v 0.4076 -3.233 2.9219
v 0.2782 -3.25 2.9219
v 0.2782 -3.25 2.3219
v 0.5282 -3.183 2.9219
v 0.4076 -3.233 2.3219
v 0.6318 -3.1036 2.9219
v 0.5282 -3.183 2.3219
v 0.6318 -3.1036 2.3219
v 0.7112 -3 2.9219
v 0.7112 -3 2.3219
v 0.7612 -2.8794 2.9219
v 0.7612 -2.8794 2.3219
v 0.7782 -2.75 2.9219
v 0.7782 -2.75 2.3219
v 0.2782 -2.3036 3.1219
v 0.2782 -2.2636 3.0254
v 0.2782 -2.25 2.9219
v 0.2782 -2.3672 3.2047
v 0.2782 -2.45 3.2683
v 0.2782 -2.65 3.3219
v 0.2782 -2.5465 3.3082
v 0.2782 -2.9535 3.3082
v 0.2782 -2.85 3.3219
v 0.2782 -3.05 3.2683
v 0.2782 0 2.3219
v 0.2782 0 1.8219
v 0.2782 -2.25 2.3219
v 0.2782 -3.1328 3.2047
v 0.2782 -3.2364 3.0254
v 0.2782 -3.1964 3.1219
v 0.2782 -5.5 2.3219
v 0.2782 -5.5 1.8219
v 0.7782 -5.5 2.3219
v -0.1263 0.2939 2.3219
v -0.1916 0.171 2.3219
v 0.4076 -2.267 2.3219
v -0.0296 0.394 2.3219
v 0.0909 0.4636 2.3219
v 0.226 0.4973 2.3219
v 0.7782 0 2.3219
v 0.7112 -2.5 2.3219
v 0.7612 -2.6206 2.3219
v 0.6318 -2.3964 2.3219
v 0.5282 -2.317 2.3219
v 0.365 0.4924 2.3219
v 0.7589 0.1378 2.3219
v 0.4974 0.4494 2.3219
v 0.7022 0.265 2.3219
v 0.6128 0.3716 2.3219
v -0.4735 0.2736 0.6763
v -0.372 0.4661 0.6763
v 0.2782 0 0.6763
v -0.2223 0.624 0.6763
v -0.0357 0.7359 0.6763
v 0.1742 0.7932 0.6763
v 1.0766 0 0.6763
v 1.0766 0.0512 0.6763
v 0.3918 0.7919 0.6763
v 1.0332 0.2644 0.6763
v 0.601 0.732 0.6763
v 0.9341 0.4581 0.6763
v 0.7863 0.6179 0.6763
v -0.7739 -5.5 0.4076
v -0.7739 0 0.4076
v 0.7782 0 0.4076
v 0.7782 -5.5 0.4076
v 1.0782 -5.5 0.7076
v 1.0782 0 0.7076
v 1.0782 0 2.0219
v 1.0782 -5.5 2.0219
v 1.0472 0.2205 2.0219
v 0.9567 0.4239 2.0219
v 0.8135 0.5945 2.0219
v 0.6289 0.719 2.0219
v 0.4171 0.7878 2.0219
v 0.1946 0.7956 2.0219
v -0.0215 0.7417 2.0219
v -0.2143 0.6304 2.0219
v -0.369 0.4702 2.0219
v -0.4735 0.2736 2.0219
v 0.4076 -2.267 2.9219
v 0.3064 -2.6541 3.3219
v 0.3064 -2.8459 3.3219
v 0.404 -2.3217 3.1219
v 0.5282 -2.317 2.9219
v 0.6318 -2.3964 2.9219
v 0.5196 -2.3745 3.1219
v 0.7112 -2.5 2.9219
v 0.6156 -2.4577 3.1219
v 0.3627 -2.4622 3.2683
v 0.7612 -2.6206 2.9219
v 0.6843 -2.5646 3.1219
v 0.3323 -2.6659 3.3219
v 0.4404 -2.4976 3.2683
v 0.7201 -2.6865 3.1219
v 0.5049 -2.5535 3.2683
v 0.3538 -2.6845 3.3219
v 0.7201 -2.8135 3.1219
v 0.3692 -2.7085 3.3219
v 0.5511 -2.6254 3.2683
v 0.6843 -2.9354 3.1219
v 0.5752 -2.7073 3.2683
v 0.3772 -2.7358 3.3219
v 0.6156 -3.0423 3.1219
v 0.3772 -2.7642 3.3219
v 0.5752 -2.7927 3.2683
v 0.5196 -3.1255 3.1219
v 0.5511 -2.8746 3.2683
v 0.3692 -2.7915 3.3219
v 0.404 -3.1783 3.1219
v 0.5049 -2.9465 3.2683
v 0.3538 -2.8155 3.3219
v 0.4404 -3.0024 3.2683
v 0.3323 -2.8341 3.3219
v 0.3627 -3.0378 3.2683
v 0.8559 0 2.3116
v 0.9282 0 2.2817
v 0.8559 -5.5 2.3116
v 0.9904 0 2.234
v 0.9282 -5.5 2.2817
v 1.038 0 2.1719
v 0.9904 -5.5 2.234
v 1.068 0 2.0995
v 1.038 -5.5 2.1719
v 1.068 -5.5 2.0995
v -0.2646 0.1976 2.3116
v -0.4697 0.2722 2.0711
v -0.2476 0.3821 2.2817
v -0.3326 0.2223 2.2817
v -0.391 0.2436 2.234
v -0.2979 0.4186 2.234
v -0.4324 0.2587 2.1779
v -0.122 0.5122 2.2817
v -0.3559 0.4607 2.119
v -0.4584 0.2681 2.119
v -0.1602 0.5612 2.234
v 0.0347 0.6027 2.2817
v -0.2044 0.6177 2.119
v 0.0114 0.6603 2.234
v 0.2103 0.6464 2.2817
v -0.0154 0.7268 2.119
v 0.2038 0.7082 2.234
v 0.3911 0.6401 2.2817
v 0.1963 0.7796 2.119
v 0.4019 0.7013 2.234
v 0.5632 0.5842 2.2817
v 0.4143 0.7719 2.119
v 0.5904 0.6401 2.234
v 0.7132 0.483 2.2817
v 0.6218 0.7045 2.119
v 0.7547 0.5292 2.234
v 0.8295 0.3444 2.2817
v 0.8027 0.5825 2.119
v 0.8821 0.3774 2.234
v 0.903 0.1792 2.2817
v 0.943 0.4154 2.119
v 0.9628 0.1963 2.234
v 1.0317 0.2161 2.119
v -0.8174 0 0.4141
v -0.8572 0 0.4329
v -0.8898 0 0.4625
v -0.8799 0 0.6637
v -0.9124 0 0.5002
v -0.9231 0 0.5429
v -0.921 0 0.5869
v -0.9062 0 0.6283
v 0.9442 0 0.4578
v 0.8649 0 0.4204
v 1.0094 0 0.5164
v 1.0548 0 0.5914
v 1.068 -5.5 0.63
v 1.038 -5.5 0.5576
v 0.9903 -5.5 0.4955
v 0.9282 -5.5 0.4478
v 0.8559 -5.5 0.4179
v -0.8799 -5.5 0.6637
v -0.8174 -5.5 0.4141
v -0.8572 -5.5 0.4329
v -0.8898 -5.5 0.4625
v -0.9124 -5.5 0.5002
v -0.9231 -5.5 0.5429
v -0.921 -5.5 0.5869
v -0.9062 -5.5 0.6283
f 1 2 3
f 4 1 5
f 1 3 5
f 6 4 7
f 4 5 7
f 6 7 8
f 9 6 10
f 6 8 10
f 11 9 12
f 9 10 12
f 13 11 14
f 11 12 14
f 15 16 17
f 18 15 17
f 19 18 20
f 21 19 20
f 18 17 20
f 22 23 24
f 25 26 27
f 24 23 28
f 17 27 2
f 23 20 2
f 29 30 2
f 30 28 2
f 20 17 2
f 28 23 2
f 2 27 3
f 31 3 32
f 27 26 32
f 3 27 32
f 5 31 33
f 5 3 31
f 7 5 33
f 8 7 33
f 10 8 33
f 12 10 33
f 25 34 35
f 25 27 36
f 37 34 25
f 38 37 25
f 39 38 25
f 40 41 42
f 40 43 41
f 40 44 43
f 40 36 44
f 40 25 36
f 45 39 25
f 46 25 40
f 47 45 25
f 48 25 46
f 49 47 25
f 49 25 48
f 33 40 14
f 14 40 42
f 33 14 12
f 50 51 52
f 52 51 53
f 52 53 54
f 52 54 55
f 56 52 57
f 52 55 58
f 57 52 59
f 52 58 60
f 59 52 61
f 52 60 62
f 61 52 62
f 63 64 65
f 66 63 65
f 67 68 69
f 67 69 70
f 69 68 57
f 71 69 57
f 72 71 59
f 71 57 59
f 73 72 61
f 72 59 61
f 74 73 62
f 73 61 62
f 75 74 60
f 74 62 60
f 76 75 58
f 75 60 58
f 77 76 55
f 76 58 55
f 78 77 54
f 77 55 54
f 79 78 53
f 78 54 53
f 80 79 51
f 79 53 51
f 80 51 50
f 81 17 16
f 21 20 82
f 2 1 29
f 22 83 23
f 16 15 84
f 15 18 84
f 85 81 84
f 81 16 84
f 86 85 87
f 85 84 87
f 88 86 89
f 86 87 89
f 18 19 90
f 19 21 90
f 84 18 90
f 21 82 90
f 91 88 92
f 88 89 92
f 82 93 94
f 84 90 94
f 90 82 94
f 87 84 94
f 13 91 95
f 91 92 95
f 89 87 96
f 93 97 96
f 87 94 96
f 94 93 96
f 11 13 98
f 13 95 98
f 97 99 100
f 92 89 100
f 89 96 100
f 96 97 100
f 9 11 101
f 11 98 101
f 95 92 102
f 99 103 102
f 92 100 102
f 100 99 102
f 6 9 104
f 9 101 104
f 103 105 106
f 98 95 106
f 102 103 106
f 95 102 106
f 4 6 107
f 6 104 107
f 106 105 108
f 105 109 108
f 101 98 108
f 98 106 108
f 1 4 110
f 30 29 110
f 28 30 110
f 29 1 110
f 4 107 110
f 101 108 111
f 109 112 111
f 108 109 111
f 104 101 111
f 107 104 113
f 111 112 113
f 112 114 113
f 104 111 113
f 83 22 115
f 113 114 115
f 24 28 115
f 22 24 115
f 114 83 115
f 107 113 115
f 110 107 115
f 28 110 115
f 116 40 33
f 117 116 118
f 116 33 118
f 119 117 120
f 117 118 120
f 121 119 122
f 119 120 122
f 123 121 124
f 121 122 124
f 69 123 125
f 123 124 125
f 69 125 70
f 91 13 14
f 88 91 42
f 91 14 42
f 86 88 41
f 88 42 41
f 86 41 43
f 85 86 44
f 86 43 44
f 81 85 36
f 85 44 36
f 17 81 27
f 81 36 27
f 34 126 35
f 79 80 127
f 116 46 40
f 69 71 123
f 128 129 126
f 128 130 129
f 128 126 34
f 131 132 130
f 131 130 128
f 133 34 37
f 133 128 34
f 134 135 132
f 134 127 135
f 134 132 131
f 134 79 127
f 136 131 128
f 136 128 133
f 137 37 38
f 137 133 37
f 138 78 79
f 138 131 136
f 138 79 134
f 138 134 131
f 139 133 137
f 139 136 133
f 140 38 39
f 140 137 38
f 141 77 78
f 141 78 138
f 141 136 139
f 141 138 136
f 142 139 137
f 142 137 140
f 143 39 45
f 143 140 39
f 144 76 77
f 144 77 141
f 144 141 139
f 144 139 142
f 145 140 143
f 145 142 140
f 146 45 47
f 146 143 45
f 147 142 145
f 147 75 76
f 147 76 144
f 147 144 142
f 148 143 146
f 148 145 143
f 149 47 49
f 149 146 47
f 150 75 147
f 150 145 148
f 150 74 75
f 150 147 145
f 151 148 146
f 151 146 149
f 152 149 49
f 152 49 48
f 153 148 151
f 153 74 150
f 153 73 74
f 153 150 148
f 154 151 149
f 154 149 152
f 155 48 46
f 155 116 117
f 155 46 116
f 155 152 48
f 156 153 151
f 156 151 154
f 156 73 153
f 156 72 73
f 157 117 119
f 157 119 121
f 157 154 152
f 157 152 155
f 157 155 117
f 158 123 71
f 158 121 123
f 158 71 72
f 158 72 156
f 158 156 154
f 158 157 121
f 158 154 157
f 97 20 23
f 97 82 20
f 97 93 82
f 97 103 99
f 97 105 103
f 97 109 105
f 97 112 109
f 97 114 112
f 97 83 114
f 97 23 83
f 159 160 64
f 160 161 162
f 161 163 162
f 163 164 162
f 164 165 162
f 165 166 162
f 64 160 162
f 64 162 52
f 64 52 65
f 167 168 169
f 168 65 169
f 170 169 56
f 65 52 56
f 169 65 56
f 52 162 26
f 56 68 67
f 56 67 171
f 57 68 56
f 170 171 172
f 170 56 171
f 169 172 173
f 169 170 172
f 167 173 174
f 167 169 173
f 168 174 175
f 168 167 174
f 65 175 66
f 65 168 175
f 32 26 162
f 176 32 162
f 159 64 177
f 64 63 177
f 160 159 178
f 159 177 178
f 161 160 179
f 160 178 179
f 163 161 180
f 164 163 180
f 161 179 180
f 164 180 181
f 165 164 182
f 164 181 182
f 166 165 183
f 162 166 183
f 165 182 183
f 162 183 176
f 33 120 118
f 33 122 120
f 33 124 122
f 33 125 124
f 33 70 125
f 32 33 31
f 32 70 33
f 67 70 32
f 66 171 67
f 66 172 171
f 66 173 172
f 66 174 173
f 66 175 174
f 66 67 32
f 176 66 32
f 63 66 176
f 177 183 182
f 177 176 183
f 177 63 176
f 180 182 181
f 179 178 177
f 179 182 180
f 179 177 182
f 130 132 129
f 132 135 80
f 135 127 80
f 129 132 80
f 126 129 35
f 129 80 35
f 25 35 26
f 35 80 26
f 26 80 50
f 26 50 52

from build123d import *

# Parameters (mm, degrees)
F1_DEPTH      = 5.5
F3_DEPTH      = 1.14554
F4_T1_DEPTH   = 7
F5_R          = 0.15
F7_DEPTH      = 1.5
F7_DEPTH_BACK = 0.8
F8_T2_ANGLE   = 359.64
F9_DEPTH      = 0.5
F10_R         = 0.29999


# Not quite as in the source:
# - a fillet or chamfer that OpenCascade refuses, or shapes differently, is made with other operations: its cross-section is extruded or revolved along the edge and cut away or added
# - a fillet or chamfer is up to 0.001 mm smaller than in the source, because OpenCascade refuses the exact size


with BuildPart() as f1:
    # F0 (on Front) → F1 (new body)
    with BuildSketch(Plane.XZ):
        Polygon((1.0782154338, 1.8218530951), (0.2782154338, 1.8218530951), (-1.1359981286, 0.4076395328), (1.0782154338, 0.4076395328), align=None)
    extrude(amount=F1_DEPTH)

    # F2 (on face) → F3 (join)
    with BuildSketch(Plane.XY.offset(1.8218530951)):
        with BuildLine():
            Line((-0.4735386629, 0.2736161147), (0.2782154338, 0))
            Line((0.2782154338, 0), (1.0782154338, 0))
            ThreePointArc((1.0782154338, 0), (0.4171339759, 0.7878462024), (-0.4735386629, 0.2736161147))
        make_face()
    extrude(amount=-F3_DEPTH)

    # F4: fillet of radius 0.3 on 1 edges, made by hand

    # F4_s2 → F4_t1 (cut)
    with BuildSketch(Plane.XZ.offset(-0.75)):
        with BuildLine():
            ThreePointArc((1.0782154338, 0.7076395328), (0.9903474681, 0.4955074984), (0.7782154338, 0.4076395328))
            Line((0.7782154338, 0.4076395328), (1.0782154338, 0.4076395328))
            Line((1.0782154338, 0.4076395328), (1.0782154338, 0.7076395328))
        make_face()
    extrude(amount=F4_T1_DEPTH, mode=Mode.SUBTRACT)

    # F5
    f5_edges = [f1.edges().sort_by_distance(p)[0] for p in [
        (-1.135998, -2.75, 0.40764),
    ]]
    fillet(f5_edges, radius=F5_R)

    # F6 (on face) → F7 (join, two sides)
    with BuildSketch(Plane.XY.offset(1.8218530951)) as f7_sk:
        with BuildLine():
            ThreePointArc((0.2782154338, -3.25), (0.6317688243, -3.1035533906), (0.7782154338, -2.75))
            ThreePointArc((0.7782154338, -2.75), (0.6317688243, -2.3964466094), (0.2782154338, -2.25))
            Line((0.2782154338, -2.25), (0.2782154338, -3.25))
        make_face()
    extrude(amount=F7_DEPTH)
    extrude(f7_sk.sketch, amount=-F7_DEPTH_BACK)

    # F8: fillet of radius 0.4 on 1 edges, made by hand

    # F8_s1 → F8_t2 (revolve, cut)
    with BuildSketch(Plane(origin=(-0.0086365771, -2.7490988249, 0), x_dir=(0, 0, 1), z_dir=(-0.0031415875, -0.9999950652, 0))):
        with BuildLine():
            ThreePointArc((2.9218530951, 0.2131465736), (3.2046958076, 0.0959892861), (3.3218530951, -0.1868534264))
            Line((3.3218530951, -0.1868534264), (3.3218530951, 0.2131465736))
            Line((3.3218530951, 0.2131465736), (2.9218530951, 0.2131465736))
        make_face()
    revolve(axis=Axis((0.2782154338, -2.75, 3.3218530951), (0, 0, -1)), revolution_arc=F8_T2_ANGLE, mode=Mode.SUBTRACT)

    # F9 (add): faces of the model
    f9_faces = [f1.faces().sort_by_distance(p)[0] for p in [
        (0.632239132, -2.1810312273, 1.8218530951),
        (0.632239132, -2.1810312273, 1.8218530951),
    ]]
    extrude(f9_faces, amount=F9_DEPTH)

    # F10 (radius 0.3 in the source; OpenCascade refuses exactly that, so slightly less here)
    f10_edges = [f1.edges().sort_by_distance(p)[0] for p in [
        (1.078215, -2.75, 2.321853),
        (0.417134, 0.787846, 2.321853),
    ]]
    fillet(f10_edges, radius=F10_R)


solid = f1.part
